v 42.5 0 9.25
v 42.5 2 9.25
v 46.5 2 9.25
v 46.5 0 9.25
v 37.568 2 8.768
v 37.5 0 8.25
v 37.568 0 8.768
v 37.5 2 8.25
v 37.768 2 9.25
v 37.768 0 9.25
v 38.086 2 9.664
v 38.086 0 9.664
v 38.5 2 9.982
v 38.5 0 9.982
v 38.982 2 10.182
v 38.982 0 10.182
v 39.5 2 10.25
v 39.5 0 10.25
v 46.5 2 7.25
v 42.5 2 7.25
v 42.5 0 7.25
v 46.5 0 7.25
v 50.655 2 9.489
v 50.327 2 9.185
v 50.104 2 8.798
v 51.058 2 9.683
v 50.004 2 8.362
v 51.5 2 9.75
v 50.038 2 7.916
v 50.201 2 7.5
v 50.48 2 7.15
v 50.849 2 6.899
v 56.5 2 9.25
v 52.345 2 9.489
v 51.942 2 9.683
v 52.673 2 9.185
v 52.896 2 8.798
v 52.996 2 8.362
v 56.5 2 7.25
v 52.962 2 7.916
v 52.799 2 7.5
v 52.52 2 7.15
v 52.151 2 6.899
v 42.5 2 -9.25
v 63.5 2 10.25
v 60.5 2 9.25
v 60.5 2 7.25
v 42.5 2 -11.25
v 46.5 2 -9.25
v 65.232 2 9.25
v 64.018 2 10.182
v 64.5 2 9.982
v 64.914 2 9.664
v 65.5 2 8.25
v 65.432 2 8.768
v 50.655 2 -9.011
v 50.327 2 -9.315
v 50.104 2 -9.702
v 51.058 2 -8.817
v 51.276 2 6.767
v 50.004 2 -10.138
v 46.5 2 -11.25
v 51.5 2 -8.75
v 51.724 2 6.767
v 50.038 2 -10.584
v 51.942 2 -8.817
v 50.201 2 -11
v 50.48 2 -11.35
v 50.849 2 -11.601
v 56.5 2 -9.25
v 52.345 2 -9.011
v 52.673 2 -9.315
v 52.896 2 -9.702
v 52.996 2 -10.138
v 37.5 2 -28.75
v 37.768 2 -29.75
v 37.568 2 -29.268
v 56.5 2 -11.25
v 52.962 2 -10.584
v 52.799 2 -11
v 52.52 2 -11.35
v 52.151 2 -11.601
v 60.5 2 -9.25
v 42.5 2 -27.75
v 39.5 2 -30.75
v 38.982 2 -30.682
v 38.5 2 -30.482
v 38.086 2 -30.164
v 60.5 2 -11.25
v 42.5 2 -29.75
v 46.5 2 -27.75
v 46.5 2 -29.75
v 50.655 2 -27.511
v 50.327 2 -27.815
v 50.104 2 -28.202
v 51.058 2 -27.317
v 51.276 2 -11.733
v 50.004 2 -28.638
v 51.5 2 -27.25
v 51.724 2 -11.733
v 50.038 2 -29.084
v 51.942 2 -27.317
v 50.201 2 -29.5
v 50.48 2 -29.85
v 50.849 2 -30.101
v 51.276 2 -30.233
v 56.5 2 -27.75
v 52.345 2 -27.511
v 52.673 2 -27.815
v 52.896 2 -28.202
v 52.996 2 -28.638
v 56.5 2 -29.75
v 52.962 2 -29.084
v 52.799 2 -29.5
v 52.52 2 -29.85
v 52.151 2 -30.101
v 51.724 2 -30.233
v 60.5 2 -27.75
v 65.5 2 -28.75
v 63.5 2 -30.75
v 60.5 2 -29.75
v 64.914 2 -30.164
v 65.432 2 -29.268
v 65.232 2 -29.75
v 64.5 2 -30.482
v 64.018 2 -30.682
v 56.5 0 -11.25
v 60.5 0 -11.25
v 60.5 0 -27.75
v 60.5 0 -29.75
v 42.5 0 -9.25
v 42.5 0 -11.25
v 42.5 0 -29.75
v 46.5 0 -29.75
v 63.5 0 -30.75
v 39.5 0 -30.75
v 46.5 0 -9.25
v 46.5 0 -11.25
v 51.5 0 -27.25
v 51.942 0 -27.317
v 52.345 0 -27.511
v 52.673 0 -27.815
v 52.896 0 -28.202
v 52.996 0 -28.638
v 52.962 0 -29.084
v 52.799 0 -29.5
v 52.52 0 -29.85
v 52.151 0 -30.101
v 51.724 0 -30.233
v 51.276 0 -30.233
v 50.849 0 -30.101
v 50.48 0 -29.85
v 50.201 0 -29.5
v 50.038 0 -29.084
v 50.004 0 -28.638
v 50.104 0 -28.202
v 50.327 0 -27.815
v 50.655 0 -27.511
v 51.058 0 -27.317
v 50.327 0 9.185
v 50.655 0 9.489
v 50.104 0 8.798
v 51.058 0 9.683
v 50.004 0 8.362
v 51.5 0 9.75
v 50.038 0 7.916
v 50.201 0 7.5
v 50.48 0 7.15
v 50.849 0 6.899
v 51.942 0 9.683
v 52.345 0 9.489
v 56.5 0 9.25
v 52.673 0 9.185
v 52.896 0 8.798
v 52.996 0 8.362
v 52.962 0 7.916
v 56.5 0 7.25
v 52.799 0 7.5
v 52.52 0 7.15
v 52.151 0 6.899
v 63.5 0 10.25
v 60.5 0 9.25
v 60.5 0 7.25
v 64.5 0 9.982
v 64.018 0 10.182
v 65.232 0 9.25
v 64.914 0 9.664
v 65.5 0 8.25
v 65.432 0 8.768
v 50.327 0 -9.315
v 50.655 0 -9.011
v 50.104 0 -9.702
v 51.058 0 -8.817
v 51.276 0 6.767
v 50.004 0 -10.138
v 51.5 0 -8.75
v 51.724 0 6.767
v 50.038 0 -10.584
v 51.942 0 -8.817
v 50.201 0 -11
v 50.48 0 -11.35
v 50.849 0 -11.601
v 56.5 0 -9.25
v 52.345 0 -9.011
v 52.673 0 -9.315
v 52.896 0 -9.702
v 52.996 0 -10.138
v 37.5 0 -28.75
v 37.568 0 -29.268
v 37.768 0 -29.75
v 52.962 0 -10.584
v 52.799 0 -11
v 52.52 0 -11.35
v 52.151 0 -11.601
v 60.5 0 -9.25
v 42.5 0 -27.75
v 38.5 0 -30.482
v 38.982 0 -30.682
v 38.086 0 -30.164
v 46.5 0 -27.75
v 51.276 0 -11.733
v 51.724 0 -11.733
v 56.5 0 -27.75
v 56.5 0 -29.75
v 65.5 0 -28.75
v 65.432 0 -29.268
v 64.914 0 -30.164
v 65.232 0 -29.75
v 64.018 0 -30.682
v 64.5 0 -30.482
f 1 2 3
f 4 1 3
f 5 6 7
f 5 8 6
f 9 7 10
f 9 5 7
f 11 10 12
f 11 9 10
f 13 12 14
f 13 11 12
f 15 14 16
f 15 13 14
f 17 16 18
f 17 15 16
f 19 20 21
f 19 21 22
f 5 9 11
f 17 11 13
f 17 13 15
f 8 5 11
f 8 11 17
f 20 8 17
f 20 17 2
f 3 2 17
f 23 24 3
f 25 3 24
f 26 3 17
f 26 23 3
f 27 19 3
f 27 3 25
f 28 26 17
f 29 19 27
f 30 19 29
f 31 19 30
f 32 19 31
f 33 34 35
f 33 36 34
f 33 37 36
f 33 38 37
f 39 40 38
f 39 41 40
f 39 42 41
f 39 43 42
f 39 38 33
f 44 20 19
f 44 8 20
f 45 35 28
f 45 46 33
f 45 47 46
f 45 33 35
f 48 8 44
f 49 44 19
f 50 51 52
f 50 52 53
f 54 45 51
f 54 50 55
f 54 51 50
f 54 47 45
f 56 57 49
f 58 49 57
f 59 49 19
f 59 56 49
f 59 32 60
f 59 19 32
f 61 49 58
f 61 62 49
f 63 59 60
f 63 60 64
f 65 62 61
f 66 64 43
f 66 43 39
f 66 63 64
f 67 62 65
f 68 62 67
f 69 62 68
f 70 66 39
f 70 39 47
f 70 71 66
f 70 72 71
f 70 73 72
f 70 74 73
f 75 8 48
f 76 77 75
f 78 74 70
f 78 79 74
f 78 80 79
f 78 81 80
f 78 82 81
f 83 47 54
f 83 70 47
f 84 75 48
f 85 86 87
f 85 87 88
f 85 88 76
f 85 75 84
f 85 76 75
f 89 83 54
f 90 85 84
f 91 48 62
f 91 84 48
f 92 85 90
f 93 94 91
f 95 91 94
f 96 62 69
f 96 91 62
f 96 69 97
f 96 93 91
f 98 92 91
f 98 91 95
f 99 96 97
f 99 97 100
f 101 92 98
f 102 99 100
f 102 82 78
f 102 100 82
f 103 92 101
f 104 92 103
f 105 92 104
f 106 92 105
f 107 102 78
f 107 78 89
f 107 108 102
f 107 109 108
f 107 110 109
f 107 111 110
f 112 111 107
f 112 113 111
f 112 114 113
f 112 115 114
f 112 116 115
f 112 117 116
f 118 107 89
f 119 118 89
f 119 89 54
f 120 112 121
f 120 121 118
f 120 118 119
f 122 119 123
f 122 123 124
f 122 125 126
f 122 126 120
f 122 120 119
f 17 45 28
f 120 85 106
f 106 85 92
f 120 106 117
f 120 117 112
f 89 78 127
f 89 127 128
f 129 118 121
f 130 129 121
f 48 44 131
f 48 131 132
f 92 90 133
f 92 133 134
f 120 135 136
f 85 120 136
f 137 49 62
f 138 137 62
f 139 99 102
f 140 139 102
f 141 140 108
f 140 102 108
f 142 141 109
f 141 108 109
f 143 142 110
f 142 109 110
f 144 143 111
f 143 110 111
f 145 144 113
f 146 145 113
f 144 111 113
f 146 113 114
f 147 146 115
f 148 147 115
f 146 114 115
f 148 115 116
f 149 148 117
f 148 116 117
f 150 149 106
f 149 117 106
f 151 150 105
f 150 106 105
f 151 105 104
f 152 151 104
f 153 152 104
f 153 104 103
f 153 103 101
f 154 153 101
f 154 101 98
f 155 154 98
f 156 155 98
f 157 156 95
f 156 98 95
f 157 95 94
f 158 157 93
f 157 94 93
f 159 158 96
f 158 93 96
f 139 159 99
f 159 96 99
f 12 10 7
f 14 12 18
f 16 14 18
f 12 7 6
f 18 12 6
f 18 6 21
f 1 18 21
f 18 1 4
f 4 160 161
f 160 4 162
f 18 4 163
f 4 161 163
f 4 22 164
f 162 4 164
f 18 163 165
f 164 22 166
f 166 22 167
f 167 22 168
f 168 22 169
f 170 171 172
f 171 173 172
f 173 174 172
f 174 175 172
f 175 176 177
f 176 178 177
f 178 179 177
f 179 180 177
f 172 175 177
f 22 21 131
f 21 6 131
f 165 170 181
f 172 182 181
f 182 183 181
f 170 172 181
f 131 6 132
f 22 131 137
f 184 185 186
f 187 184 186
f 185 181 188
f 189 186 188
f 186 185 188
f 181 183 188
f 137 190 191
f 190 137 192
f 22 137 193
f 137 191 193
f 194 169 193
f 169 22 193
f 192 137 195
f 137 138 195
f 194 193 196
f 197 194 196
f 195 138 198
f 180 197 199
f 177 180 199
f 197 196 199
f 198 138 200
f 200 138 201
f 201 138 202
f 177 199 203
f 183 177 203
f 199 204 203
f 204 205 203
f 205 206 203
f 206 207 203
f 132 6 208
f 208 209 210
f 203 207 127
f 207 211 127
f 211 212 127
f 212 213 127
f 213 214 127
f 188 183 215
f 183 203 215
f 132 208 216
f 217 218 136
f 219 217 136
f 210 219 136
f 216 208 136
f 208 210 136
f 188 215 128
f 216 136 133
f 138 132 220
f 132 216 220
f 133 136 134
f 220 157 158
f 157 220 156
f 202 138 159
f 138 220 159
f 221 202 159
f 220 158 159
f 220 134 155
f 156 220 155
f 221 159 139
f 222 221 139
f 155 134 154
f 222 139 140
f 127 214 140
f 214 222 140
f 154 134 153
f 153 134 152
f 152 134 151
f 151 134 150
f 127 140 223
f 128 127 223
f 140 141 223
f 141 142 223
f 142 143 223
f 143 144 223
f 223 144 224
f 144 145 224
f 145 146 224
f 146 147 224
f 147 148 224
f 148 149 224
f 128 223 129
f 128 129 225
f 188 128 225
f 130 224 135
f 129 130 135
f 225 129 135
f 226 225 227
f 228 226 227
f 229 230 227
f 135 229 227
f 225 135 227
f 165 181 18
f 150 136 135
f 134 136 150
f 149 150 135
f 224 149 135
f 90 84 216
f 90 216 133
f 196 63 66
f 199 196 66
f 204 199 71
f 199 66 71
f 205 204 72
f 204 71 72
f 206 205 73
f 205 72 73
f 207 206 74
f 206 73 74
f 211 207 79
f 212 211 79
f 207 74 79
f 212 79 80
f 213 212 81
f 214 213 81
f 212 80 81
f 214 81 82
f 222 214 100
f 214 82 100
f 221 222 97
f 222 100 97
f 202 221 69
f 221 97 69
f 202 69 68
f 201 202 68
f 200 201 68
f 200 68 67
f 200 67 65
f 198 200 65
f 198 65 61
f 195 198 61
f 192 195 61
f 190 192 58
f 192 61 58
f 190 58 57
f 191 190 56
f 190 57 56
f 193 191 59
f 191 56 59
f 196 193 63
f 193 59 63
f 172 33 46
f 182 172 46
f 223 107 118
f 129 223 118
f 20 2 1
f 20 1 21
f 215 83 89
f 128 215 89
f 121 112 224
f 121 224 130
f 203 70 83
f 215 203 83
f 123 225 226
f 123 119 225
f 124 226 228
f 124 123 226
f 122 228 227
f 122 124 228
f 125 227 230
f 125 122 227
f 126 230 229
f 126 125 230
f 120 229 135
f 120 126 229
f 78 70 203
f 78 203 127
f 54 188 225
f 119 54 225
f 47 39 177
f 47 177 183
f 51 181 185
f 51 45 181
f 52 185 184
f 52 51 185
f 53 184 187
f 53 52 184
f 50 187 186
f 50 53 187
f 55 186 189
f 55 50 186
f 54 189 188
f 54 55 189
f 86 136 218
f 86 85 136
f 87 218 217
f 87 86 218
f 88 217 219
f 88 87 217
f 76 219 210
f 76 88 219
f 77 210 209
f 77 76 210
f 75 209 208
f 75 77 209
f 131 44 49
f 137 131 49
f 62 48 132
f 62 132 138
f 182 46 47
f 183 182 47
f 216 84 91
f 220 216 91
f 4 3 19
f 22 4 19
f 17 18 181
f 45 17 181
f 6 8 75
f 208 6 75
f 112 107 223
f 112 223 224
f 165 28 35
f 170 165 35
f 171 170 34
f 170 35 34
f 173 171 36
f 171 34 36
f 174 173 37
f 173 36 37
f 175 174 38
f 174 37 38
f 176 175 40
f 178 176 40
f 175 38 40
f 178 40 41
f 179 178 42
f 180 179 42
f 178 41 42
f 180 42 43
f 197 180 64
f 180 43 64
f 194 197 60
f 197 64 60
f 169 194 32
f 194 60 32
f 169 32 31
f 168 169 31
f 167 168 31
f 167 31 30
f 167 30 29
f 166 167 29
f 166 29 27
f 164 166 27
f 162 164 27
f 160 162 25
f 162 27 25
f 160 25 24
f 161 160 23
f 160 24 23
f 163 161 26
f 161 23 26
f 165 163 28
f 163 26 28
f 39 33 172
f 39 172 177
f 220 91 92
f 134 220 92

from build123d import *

# Parameters (mm, degrees)
SKETCH1_R           = 2.25
BOSS_EXTRUDE1_DEPTH = 2
FILLET1_R           = 10.25
FILLET2_R           = 2
SKETCH2_R           = 1.5
SKETCH2_W           = 4
SKETCH2_H           = 2
CUT_EXTRUDE1_DEPTH  = 2
FILLET3_R           = 8
SKETCH3_W           = 40.842978794
SKETCH3_H           = 39.737994682
CUT_EXTRUDE2_DEPTH  = 2


with BuildPart() as part:
    # Sketch1 → Boss-Extrude1 (new body)
    with BuildSketch(Plane(origin=(0, 0, 0), x_dir=(1, 0, 0), z_dir=(0, 1, 0))):
        Polygon((0, 0), (37.5, 0), (37.5, -10.25), (65.5, -10.25), (65.5, -0.75), (65.5, 21.25), (65.5, 30.75), (37.5, 30.75), (37.5, 20.5), (0, 20.5), align=None)
        with Locations(Location((10.25, 10.25, 0), (0, 0, 270))):
            Circle(SKETCH1_R, mode=Mode.SUBTRACT)
    extrude(amount=BOSS_EXTRUDE1_DEPTH)

    # Fillet1
    fillet1_edges = [part.edges().sort_by_distance(p)[0] for p in [
        (0, 1, -20.5),
        (0, 1, 0),
    ]]
    fillet(fillet1_edges, radius=FILLET1_R - 0.0001)  # a hair under: the kernel refuses the full size

    # Fillet2
    fillet2_edges = [part.edges().sort_by_distance(p)[0] for p in [
        (37.5, 1, -30.75),
        (65.5, 1, -30.75),
        (65.5, 1, 10.25),
        (37.5, 1, 10.25),
    ]]
    fillet(fillet2_edges, radius=FILLET2_R)

    # Sketch2 → Cut-Extrude1 (cut)
    with BuildSketch(Plane(origin=(0, 2, 0), x_dir=(1, 0, 0), z_dir=(0, 1, 0))):
        with Locations(Location((51.5, 28.75, 0), (0, 0, 270))):
            Circle(SKETCH2_R)
        with Locations(Location((51.5, 10.25, 0), (0, 0, 270))):
            Circle(SKETCH2_R)
        with Locations(Location((51.5, -8.25, 0), (0, 0, 270))):
            Circle(SKETCH2_R)
        with Locations((44.5, 28.75)):
            Rectangle(SKETCH2_W, SKETCH2_H)
        with Locations((58.5, 28.75)):
            Rectangle(SKETCH2_W, SKETCH2_H)
        with Locations((44.5, 10.25)):
            Rectangle(SKETCH2_W, SKETCH2_H)
        with Locations((58.5, 10.25)):
            Rectangle(SKETCH2_W, SKETCH2_H)
        with Locations((44.5, -8.25)):
            Rectangle(SKETCH2_W, SKETCH2_H)
        with Locations((58.5, -8.25)):
            Rectangle(SKETCH2_W, SKETCH2_H)
    extrude(amount=-CUT_EXTRUDE1_DEPTH, mode=Mode.SUBTRACT)

    # Fillet3
    fillet3_edges = [part.edges().sort_by_distance(p)[0] for p in [
        (37.5, 1, -20.5),
        (37.5, 1, 0),
    ]]
    fillet(fillet3_edges, radius=FILLET3_R)

    # Sketch3 → Cut-Extrude2 (cut)
    with BuildSketch(Plane(origin=(0, 2, 0), x_dir=(1, 0, 0), z_dir=(0, 1, 0))):
        with Locations((17.078510603, 8.881002659)):
            Rectangle(SKETCH3_W, SKETCH3_H)
    extrude(amount=-CUT_EXTRUDE2_DEPTH, mode=Mode.SUBTRACT)


solid = part.part
